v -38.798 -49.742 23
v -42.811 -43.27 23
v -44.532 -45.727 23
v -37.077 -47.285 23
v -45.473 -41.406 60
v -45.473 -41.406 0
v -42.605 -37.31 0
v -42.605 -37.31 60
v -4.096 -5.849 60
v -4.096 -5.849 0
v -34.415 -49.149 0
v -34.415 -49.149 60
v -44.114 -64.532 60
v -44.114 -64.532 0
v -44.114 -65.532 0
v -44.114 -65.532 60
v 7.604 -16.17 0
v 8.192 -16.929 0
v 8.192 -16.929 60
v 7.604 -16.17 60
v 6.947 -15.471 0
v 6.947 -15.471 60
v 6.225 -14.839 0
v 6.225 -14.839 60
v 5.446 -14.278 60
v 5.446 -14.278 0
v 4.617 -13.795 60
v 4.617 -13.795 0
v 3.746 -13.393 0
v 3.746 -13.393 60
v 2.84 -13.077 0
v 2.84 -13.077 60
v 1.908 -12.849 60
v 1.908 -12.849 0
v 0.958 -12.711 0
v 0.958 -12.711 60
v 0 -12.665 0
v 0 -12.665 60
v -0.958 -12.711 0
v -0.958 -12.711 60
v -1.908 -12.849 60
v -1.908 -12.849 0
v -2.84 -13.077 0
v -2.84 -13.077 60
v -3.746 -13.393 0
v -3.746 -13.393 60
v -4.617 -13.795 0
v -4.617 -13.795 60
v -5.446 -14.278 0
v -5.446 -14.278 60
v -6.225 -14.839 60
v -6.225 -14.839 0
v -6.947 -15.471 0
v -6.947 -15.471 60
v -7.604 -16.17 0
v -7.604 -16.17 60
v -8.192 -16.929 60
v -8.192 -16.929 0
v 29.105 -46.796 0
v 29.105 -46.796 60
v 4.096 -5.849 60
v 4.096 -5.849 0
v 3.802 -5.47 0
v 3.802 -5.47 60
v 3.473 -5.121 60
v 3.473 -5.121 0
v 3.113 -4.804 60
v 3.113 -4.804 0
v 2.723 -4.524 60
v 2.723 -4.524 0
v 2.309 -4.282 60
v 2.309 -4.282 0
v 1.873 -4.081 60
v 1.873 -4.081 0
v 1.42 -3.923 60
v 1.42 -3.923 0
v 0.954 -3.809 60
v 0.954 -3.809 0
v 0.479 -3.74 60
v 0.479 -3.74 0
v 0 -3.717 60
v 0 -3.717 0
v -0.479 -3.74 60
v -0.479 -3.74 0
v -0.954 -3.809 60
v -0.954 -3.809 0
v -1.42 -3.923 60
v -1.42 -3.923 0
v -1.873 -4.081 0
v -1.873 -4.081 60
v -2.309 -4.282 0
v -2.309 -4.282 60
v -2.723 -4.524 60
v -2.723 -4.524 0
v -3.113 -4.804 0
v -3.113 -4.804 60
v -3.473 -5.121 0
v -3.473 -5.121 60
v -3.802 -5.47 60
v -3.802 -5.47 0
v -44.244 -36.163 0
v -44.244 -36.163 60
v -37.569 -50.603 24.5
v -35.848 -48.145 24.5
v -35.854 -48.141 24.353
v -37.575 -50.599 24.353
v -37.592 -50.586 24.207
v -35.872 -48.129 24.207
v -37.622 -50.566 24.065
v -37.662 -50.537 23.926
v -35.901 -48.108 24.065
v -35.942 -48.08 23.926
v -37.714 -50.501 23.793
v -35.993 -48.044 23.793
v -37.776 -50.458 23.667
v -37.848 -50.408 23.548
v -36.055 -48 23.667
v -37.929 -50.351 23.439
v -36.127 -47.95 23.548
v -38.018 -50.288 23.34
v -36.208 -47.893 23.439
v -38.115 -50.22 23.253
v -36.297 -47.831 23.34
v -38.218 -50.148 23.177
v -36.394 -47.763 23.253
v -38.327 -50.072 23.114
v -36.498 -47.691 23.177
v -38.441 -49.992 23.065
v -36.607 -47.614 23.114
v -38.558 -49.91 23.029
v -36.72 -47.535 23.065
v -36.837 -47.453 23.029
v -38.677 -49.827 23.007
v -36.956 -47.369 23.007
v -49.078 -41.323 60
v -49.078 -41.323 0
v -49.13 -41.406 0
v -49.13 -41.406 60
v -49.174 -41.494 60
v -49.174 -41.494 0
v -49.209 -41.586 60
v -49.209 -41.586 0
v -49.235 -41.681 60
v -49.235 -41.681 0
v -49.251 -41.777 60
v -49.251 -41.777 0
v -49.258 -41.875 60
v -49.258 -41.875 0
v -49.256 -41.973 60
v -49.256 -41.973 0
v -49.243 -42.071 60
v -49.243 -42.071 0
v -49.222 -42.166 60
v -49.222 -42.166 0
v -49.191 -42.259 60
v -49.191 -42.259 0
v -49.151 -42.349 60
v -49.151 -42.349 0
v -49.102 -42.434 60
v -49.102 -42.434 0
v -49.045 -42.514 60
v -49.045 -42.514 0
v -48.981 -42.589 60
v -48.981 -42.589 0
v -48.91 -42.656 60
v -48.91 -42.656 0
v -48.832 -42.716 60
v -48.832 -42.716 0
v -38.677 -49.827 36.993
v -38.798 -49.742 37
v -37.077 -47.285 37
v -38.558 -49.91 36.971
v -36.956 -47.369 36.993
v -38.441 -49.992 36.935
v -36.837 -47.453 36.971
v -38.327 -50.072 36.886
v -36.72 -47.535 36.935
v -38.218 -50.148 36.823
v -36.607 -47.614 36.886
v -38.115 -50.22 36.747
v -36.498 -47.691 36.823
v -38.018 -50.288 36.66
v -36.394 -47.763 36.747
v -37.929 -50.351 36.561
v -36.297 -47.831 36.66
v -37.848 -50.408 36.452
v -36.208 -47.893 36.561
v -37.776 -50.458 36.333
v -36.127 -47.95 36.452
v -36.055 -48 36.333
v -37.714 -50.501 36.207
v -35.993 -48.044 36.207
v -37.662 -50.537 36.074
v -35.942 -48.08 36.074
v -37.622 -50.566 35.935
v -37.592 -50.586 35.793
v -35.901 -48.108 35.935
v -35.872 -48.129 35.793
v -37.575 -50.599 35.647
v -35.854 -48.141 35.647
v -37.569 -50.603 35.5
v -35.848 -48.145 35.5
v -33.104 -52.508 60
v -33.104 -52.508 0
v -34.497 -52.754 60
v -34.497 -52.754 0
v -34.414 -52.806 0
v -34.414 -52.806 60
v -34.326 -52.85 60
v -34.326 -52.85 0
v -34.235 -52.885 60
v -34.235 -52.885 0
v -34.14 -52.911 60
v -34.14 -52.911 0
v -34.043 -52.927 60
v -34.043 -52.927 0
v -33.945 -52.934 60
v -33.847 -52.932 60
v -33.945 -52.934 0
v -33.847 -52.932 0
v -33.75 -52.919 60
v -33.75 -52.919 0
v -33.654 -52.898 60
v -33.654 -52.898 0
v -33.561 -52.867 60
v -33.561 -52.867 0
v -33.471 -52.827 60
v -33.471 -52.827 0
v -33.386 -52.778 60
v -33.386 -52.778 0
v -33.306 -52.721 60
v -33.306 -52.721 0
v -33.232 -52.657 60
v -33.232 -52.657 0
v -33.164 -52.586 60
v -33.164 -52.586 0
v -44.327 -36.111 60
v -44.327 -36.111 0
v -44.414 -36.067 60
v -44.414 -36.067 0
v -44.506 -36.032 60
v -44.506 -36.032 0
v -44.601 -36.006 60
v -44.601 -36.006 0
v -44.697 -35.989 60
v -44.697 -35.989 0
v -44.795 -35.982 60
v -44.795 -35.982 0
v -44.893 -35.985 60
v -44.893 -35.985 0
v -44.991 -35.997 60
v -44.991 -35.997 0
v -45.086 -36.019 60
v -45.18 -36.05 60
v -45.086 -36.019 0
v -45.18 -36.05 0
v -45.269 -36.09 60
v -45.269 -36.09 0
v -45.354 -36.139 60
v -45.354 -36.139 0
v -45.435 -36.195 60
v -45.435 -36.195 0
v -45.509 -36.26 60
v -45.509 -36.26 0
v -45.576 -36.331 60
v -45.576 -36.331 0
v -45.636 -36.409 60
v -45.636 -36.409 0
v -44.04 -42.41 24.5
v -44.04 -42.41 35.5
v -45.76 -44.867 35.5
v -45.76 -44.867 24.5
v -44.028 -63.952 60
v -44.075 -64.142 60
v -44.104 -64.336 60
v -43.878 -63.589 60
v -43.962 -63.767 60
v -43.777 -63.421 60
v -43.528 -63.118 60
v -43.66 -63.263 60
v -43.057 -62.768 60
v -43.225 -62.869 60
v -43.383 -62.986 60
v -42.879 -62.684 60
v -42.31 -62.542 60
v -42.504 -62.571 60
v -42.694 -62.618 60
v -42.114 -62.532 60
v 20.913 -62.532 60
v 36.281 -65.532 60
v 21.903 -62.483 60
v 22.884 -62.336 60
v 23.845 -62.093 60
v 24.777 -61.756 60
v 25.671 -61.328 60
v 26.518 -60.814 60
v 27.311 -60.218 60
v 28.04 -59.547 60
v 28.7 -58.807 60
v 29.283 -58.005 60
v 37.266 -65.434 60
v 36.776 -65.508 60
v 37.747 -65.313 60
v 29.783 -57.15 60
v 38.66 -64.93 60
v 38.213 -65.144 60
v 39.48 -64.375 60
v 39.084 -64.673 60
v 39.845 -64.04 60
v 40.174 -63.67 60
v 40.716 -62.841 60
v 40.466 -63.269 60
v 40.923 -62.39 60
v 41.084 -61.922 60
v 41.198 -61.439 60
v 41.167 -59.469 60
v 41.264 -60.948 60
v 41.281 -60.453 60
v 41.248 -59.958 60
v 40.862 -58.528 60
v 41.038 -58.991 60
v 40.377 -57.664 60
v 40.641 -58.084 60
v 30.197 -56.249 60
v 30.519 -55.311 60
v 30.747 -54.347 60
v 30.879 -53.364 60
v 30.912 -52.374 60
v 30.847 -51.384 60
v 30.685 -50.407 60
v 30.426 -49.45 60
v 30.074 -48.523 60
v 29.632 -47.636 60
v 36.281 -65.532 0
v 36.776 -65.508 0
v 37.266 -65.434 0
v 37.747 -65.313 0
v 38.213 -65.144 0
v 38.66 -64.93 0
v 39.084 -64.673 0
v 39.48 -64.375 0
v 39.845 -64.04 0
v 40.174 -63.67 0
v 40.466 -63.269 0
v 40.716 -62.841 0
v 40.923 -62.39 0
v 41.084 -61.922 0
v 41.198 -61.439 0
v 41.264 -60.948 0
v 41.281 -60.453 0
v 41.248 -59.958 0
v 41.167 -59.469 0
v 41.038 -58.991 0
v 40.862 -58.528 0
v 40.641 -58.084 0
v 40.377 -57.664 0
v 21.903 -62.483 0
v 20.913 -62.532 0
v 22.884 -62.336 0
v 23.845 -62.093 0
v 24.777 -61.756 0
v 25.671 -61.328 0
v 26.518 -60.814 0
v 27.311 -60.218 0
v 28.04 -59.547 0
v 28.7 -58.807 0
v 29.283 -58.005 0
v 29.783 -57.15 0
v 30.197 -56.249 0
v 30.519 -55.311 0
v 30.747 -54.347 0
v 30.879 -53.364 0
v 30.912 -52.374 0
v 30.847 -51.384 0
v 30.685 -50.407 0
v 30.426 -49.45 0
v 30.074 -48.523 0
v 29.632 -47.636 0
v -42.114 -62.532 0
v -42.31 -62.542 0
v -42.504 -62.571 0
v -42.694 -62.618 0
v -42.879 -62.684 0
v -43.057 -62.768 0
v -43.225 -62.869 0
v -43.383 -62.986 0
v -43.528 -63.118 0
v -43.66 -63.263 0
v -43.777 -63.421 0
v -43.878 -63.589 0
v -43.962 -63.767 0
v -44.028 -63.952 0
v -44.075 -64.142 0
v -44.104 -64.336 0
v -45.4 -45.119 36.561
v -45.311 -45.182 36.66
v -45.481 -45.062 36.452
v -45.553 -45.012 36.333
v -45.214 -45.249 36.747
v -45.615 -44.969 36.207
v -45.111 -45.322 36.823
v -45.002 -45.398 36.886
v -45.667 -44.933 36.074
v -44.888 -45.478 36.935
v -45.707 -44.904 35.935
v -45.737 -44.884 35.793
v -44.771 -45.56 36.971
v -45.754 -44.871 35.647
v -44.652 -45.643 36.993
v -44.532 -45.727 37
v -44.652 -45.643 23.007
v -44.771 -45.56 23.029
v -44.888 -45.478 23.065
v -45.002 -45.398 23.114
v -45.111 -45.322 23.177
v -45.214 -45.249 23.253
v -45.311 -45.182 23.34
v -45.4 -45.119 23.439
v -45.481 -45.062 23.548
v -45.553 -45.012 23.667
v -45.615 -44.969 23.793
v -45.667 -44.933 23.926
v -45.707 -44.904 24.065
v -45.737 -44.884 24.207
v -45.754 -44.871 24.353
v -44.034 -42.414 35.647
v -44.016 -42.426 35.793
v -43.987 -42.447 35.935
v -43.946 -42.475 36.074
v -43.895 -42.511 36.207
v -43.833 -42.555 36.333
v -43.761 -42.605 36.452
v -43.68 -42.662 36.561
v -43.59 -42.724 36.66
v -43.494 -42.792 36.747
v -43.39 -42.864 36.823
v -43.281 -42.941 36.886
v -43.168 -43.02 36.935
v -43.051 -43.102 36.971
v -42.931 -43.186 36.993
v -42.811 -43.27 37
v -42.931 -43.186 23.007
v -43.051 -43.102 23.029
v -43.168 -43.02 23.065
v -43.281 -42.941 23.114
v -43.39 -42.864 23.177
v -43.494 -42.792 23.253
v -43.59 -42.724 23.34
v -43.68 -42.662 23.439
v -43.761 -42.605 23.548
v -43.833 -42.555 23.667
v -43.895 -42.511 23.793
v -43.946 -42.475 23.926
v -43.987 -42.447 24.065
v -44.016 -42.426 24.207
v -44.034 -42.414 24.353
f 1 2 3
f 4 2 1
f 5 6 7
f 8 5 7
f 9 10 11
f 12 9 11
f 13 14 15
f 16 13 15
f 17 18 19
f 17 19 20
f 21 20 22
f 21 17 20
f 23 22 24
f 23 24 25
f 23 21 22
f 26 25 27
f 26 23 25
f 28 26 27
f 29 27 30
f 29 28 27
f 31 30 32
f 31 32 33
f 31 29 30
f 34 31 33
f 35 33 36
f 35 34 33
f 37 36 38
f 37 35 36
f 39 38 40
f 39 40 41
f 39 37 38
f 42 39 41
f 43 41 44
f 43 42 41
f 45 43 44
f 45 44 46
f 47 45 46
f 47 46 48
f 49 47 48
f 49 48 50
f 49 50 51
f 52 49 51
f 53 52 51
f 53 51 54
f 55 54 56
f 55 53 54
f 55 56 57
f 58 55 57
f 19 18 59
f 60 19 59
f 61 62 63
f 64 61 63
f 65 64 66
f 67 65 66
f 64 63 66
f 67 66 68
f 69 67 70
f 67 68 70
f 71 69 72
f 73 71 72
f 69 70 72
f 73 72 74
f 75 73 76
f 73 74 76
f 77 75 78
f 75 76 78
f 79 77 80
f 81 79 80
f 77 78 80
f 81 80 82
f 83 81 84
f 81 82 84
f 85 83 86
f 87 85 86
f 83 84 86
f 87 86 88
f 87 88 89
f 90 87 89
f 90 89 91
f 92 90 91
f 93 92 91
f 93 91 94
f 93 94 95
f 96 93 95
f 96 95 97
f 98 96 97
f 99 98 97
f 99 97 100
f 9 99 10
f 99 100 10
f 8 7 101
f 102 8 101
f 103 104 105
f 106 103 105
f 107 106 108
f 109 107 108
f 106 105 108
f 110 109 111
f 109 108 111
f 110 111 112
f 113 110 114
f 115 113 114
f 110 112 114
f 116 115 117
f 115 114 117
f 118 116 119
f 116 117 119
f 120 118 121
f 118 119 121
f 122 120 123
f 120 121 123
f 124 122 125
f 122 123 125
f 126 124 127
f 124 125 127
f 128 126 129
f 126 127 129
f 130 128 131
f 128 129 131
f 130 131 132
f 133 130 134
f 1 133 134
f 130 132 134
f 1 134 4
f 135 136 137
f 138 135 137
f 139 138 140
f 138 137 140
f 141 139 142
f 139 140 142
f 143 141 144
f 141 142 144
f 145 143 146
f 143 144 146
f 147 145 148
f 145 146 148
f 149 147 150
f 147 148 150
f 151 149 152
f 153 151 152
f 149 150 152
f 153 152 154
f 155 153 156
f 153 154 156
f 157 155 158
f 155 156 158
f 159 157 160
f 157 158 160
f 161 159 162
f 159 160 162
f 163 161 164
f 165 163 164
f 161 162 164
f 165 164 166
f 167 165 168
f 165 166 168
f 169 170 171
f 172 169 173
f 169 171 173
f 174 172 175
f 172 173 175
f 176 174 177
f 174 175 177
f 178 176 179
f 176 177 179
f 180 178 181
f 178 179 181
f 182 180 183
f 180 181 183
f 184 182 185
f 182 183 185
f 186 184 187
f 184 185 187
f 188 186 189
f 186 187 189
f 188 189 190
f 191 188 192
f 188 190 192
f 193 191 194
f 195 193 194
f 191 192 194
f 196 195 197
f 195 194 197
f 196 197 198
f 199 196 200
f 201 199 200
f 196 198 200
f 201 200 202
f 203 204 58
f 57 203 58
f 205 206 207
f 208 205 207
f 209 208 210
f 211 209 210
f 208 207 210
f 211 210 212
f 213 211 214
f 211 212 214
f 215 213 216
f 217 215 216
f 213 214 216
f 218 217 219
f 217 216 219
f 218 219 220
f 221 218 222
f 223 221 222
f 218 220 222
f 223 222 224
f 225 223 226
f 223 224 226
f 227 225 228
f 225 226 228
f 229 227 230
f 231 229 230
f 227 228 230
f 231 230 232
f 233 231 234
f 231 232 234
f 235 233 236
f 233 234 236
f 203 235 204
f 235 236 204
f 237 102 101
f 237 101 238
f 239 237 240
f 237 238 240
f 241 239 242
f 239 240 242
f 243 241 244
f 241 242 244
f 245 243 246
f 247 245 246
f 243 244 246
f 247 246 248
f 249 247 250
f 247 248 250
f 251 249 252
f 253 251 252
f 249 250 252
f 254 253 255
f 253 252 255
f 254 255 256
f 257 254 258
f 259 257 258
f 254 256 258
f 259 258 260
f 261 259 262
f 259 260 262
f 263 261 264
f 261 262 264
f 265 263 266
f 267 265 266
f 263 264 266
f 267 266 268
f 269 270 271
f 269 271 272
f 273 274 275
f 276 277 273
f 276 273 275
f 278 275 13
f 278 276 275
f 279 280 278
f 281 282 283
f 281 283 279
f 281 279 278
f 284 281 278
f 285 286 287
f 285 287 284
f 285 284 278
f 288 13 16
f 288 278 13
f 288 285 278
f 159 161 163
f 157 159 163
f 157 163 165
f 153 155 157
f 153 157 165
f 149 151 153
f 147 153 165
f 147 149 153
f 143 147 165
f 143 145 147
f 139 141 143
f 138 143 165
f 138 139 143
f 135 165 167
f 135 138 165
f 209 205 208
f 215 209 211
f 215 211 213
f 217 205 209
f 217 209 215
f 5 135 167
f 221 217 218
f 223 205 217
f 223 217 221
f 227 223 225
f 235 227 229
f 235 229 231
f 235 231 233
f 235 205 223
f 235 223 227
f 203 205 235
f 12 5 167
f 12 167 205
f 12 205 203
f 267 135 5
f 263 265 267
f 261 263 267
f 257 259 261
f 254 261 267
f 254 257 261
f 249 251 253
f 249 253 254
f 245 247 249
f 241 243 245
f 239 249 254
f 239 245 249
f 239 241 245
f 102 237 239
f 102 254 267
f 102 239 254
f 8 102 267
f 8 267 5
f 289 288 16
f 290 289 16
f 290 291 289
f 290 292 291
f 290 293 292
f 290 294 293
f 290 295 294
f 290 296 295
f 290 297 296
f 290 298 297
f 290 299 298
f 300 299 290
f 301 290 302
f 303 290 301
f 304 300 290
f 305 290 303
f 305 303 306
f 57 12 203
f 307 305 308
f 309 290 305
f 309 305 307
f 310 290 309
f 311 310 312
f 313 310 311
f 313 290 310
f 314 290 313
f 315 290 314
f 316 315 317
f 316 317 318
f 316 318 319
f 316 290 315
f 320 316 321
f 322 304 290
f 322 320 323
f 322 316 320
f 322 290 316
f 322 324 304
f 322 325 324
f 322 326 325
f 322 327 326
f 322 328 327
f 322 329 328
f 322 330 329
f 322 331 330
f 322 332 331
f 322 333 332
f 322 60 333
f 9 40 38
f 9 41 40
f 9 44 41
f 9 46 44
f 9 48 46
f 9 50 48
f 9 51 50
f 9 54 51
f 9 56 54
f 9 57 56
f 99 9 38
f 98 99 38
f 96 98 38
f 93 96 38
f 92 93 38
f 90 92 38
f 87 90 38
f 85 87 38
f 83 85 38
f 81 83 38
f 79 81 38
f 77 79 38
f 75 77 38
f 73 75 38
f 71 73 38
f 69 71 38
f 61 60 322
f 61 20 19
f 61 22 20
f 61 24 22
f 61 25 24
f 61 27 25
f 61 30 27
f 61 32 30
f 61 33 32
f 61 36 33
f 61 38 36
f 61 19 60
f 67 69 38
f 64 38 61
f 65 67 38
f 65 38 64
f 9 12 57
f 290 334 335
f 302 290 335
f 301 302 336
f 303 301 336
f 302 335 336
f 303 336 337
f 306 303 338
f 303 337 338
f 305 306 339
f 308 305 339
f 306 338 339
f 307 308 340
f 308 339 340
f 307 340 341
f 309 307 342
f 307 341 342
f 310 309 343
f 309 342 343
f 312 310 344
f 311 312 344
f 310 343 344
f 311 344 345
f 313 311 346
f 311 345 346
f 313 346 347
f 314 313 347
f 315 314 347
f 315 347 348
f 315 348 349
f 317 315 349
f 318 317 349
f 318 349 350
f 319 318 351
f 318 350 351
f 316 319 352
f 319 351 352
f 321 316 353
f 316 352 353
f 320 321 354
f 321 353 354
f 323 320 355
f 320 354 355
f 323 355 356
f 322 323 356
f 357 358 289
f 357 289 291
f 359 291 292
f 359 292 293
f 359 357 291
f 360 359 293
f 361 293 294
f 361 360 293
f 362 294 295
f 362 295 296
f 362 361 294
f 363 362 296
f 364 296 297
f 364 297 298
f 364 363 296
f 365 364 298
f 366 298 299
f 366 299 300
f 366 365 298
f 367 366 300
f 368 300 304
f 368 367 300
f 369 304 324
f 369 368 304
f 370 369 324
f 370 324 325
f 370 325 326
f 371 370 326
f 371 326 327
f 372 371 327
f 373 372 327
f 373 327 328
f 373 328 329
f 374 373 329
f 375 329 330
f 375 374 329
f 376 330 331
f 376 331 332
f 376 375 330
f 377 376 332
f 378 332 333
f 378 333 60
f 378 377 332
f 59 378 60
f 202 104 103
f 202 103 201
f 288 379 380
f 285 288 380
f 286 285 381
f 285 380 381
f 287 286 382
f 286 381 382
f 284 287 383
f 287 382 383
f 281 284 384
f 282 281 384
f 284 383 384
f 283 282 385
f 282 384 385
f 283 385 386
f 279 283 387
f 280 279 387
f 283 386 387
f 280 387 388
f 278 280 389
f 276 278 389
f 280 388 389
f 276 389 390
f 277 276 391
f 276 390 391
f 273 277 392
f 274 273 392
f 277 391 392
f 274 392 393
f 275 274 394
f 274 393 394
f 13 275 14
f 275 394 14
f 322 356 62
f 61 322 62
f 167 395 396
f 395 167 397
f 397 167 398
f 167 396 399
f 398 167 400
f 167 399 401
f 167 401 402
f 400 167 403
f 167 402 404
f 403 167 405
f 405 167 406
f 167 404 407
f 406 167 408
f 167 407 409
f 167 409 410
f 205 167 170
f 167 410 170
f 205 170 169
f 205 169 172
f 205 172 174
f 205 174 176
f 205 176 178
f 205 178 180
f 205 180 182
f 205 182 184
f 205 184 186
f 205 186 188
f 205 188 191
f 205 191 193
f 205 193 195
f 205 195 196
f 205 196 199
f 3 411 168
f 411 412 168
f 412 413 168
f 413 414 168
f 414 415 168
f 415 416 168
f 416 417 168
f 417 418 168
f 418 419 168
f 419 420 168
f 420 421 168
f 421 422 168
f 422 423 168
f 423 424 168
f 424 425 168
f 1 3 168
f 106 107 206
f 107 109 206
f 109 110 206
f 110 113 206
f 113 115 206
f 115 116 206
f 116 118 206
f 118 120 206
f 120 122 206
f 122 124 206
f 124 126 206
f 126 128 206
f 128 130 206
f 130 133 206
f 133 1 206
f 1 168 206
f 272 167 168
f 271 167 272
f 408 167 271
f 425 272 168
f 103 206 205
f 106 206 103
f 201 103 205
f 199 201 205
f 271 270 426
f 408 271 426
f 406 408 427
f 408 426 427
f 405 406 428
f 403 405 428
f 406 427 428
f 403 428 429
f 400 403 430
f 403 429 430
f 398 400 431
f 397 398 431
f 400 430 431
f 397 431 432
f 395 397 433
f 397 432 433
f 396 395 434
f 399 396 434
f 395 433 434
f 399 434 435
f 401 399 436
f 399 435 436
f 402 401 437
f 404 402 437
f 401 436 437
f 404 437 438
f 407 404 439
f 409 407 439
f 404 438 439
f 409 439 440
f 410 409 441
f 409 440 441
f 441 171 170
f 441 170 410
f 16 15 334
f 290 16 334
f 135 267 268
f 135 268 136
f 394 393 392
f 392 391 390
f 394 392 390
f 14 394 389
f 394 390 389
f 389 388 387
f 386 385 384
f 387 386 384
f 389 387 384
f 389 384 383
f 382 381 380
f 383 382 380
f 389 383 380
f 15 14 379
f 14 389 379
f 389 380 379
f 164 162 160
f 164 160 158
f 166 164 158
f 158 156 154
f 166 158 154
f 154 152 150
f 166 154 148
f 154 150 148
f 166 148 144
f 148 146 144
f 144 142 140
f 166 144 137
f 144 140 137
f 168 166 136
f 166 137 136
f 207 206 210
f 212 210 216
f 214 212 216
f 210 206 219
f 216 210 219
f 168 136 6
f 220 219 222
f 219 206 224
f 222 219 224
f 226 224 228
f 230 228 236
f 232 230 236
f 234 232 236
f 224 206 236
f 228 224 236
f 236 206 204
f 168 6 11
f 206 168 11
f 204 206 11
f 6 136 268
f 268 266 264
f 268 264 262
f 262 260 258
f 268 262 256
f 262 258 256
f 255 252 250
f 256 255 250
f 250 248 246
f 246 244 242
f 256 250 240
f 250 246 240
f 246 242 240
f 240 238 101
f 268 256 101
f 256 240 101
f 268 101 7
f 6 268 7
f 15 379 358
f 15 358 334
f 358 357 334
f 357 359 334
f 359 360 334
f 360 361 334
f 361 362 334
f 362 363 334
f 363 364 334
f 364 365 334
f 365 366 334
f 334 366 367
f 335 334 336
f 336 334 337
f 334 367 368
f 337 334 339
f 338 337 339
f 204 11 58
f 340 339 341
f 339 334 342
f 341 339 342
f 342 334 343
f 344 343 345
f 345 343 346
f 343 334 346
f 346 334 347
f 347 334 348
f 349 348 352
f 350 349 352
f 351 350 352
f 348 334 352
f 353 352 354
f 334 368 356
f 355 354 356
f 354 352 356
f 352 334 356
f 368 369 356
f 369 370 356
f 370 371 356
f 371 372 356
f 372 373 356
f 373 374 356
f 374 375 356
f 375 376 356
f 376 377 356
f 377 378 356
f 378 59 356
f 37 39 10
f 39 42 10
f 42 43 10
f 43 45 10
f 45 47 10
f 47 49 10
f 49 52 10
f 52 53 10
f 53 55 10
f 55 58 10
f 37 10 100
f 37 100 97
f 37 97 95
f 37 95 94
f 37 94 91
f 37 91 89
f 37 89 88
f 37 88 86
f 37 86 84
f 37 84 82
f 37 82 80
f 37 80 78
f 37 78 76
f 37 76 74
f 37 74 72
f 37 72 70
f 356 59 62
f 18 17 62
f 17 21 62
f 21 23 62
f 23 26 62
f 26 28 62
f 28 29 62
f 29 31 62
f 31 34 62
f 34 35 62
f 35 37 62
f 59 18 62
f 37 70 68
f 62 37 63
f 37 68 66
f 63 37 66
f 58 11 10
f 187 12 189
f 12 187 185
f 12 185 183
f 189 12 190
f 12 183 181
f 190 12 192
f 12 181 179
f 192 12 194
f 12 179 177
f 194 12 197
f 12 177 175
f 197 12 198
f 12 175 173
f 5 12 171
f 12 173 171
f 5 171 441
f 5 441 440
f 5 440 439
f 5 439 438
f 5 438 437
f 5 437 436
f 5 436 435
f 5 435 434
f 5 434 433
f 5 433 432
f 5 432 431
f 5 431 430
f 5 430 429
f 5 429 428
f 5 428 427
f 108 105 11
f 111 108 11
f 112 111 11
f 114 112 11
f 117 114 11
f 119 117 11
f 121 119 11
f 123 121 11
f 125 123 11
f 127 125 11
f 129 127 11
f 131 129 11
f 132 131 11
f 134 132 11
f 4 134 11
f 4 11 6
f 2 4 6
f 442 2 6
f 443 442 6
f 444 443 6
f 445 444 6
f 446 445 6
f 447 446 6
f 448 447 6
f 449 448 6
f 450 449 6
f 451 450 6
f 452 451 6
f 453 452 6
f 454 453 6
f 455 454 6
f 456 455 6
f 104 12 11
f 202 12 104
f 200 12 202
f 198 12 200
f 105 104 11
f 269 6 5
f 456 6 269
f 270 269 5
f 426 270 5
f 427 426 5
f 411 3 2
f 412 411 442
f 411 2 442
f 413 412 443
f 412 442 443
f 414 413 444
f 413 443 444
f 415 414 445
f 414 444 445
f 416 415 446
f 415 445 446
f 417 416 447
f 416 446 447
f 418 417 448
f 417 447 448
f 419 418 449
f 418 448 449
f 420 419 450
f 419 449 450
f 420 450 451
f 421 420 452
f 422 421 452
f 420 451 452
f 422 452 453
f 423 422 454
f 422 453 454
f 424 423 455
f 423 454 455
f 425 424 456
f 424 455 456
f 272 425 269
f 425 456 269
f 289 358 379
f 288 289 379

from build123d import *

# Parameters (mm, degrees)
PAD_DEPTH    = 60
POCKET_DEPTH = 21.9353755374


with BuildPart() as part:
    # Sketch → Pad (new body)
    with BuildSketch(Plane.XY):
        with BuildLine():
            Line((-4.0957602214, -5.8493517964), (-34.4145861811, -49.1491226573))
            Line((-34.4145861811, -49.1491226573), (-45.473138779, -41.4058407666))
            Line((-45.473138779, -41.4058407666), (-42.6052565972, -37.3100805452))
            Line((-42.6052565972, -37.3100805452), (-44.2435606858, -36.1629276725))
            ThreePointArc((-44.2435606858, -36.1629276725), (-44.9907852998, -35.9972719637), (-45.6362891664, -36.4085032804))
            Line((-45.6362891664, -36.4085032804), (-49.0777477845, -41.3234155461))
            ThreePointArc((-49.0777477845, -41.3234155461), (-49.2434034933, -42.0706401601), (-48.8321721766, -42.7161440268))
            Line((-48.8321721766, -42.7161440268), (-34.4970114015, -52.7537316629))
            ThreePointArc((-34.4970114015, -52.7537316629), (-33.7497867875, -52.9193873716), (-33.1042829209, -52.508156055))
            Line((-33.1042829209, -52.508156055), (-8.1915204429, -16.9290439796))
            ThreePointArc((8.1915204429, -16.9290439796), (0, -12.6648083431), (-8.1915204429, -16.9290439796))
            Line((8.1915204429, -16.9290439796), (29.1048677003, -46.7963991796))
            ThreePointArc((20.9133472575, -62.5321635431), (29.7834555892, -57.1496496755), (29.1048677003, -46.7963991796))
            Line((20.9133472575, -62.5321635431), (-42.1138850919, -62.5321635431))
            ThreePointArc((-42.1138850919, -62.5321635431), (-43.5280986543, -63.1179499807), (-44.1138850919, -64.5321635431))
            Line((-44.1138850919, -64.5321635431), (-44.1138850919, -65.5321635431))
            Line((-44.1138850919, -65.5321635431), (36.2812042732, -65.5321635431))
            ThreePointArc((36.2812042732, -65.5321635431), (40.7162584391, -62.8409066093), (40.3769644947, -57.6642813614))
            Line((40.3769644947, -57.6642813614), (4.0957602214, -5.8493517964))
            ThreePointArc((4.0957602214, -5.8493517964), (0, -3.7172339781), (-4.0957602214, -5.8493517964))
        make_face()
    extrude(amount=PAD_DEPTH)

    # Sketch001 (on Face9 of Pad) → Pocket (cut, through all)
    with BuildSketch(Plane(origin=(-34.4145861811, -49.1491226573, 0), x_dir=(-0.8191520443, 0.5735764364, 0), z_dir=(0.5735764364, 0.8191520443, 0))):
        with BuildLine():
            Line((1.75, 24.5), (1.75, 35.5))
            ThreePointArc((3.25, 37), (2.1893398282, 36.5606601718), (1.75, 35.5))
            Line((3.25, 37), (10.25, 37))
            ThreePointArc((11.75, 35.5), (11.3106601718, 36.5606601718), (10.25, 37))
            Line((11.75, 35.5), (11.75, 24.5))
            ThreePointArc((10.25, 23), (11.3106601718, 23.4393398282), (11.75, 24.5))
            Line((10.25, 23), (3.25, 23))
            ThreePointArc((1.75, 24.5), (2.1893398282, 23.4393398282), (3.25, 23))
        make_face()
    extrude(amount=-POCKET_DEPTH, mode=Mode.SUBTRACT)


solid = part.part
